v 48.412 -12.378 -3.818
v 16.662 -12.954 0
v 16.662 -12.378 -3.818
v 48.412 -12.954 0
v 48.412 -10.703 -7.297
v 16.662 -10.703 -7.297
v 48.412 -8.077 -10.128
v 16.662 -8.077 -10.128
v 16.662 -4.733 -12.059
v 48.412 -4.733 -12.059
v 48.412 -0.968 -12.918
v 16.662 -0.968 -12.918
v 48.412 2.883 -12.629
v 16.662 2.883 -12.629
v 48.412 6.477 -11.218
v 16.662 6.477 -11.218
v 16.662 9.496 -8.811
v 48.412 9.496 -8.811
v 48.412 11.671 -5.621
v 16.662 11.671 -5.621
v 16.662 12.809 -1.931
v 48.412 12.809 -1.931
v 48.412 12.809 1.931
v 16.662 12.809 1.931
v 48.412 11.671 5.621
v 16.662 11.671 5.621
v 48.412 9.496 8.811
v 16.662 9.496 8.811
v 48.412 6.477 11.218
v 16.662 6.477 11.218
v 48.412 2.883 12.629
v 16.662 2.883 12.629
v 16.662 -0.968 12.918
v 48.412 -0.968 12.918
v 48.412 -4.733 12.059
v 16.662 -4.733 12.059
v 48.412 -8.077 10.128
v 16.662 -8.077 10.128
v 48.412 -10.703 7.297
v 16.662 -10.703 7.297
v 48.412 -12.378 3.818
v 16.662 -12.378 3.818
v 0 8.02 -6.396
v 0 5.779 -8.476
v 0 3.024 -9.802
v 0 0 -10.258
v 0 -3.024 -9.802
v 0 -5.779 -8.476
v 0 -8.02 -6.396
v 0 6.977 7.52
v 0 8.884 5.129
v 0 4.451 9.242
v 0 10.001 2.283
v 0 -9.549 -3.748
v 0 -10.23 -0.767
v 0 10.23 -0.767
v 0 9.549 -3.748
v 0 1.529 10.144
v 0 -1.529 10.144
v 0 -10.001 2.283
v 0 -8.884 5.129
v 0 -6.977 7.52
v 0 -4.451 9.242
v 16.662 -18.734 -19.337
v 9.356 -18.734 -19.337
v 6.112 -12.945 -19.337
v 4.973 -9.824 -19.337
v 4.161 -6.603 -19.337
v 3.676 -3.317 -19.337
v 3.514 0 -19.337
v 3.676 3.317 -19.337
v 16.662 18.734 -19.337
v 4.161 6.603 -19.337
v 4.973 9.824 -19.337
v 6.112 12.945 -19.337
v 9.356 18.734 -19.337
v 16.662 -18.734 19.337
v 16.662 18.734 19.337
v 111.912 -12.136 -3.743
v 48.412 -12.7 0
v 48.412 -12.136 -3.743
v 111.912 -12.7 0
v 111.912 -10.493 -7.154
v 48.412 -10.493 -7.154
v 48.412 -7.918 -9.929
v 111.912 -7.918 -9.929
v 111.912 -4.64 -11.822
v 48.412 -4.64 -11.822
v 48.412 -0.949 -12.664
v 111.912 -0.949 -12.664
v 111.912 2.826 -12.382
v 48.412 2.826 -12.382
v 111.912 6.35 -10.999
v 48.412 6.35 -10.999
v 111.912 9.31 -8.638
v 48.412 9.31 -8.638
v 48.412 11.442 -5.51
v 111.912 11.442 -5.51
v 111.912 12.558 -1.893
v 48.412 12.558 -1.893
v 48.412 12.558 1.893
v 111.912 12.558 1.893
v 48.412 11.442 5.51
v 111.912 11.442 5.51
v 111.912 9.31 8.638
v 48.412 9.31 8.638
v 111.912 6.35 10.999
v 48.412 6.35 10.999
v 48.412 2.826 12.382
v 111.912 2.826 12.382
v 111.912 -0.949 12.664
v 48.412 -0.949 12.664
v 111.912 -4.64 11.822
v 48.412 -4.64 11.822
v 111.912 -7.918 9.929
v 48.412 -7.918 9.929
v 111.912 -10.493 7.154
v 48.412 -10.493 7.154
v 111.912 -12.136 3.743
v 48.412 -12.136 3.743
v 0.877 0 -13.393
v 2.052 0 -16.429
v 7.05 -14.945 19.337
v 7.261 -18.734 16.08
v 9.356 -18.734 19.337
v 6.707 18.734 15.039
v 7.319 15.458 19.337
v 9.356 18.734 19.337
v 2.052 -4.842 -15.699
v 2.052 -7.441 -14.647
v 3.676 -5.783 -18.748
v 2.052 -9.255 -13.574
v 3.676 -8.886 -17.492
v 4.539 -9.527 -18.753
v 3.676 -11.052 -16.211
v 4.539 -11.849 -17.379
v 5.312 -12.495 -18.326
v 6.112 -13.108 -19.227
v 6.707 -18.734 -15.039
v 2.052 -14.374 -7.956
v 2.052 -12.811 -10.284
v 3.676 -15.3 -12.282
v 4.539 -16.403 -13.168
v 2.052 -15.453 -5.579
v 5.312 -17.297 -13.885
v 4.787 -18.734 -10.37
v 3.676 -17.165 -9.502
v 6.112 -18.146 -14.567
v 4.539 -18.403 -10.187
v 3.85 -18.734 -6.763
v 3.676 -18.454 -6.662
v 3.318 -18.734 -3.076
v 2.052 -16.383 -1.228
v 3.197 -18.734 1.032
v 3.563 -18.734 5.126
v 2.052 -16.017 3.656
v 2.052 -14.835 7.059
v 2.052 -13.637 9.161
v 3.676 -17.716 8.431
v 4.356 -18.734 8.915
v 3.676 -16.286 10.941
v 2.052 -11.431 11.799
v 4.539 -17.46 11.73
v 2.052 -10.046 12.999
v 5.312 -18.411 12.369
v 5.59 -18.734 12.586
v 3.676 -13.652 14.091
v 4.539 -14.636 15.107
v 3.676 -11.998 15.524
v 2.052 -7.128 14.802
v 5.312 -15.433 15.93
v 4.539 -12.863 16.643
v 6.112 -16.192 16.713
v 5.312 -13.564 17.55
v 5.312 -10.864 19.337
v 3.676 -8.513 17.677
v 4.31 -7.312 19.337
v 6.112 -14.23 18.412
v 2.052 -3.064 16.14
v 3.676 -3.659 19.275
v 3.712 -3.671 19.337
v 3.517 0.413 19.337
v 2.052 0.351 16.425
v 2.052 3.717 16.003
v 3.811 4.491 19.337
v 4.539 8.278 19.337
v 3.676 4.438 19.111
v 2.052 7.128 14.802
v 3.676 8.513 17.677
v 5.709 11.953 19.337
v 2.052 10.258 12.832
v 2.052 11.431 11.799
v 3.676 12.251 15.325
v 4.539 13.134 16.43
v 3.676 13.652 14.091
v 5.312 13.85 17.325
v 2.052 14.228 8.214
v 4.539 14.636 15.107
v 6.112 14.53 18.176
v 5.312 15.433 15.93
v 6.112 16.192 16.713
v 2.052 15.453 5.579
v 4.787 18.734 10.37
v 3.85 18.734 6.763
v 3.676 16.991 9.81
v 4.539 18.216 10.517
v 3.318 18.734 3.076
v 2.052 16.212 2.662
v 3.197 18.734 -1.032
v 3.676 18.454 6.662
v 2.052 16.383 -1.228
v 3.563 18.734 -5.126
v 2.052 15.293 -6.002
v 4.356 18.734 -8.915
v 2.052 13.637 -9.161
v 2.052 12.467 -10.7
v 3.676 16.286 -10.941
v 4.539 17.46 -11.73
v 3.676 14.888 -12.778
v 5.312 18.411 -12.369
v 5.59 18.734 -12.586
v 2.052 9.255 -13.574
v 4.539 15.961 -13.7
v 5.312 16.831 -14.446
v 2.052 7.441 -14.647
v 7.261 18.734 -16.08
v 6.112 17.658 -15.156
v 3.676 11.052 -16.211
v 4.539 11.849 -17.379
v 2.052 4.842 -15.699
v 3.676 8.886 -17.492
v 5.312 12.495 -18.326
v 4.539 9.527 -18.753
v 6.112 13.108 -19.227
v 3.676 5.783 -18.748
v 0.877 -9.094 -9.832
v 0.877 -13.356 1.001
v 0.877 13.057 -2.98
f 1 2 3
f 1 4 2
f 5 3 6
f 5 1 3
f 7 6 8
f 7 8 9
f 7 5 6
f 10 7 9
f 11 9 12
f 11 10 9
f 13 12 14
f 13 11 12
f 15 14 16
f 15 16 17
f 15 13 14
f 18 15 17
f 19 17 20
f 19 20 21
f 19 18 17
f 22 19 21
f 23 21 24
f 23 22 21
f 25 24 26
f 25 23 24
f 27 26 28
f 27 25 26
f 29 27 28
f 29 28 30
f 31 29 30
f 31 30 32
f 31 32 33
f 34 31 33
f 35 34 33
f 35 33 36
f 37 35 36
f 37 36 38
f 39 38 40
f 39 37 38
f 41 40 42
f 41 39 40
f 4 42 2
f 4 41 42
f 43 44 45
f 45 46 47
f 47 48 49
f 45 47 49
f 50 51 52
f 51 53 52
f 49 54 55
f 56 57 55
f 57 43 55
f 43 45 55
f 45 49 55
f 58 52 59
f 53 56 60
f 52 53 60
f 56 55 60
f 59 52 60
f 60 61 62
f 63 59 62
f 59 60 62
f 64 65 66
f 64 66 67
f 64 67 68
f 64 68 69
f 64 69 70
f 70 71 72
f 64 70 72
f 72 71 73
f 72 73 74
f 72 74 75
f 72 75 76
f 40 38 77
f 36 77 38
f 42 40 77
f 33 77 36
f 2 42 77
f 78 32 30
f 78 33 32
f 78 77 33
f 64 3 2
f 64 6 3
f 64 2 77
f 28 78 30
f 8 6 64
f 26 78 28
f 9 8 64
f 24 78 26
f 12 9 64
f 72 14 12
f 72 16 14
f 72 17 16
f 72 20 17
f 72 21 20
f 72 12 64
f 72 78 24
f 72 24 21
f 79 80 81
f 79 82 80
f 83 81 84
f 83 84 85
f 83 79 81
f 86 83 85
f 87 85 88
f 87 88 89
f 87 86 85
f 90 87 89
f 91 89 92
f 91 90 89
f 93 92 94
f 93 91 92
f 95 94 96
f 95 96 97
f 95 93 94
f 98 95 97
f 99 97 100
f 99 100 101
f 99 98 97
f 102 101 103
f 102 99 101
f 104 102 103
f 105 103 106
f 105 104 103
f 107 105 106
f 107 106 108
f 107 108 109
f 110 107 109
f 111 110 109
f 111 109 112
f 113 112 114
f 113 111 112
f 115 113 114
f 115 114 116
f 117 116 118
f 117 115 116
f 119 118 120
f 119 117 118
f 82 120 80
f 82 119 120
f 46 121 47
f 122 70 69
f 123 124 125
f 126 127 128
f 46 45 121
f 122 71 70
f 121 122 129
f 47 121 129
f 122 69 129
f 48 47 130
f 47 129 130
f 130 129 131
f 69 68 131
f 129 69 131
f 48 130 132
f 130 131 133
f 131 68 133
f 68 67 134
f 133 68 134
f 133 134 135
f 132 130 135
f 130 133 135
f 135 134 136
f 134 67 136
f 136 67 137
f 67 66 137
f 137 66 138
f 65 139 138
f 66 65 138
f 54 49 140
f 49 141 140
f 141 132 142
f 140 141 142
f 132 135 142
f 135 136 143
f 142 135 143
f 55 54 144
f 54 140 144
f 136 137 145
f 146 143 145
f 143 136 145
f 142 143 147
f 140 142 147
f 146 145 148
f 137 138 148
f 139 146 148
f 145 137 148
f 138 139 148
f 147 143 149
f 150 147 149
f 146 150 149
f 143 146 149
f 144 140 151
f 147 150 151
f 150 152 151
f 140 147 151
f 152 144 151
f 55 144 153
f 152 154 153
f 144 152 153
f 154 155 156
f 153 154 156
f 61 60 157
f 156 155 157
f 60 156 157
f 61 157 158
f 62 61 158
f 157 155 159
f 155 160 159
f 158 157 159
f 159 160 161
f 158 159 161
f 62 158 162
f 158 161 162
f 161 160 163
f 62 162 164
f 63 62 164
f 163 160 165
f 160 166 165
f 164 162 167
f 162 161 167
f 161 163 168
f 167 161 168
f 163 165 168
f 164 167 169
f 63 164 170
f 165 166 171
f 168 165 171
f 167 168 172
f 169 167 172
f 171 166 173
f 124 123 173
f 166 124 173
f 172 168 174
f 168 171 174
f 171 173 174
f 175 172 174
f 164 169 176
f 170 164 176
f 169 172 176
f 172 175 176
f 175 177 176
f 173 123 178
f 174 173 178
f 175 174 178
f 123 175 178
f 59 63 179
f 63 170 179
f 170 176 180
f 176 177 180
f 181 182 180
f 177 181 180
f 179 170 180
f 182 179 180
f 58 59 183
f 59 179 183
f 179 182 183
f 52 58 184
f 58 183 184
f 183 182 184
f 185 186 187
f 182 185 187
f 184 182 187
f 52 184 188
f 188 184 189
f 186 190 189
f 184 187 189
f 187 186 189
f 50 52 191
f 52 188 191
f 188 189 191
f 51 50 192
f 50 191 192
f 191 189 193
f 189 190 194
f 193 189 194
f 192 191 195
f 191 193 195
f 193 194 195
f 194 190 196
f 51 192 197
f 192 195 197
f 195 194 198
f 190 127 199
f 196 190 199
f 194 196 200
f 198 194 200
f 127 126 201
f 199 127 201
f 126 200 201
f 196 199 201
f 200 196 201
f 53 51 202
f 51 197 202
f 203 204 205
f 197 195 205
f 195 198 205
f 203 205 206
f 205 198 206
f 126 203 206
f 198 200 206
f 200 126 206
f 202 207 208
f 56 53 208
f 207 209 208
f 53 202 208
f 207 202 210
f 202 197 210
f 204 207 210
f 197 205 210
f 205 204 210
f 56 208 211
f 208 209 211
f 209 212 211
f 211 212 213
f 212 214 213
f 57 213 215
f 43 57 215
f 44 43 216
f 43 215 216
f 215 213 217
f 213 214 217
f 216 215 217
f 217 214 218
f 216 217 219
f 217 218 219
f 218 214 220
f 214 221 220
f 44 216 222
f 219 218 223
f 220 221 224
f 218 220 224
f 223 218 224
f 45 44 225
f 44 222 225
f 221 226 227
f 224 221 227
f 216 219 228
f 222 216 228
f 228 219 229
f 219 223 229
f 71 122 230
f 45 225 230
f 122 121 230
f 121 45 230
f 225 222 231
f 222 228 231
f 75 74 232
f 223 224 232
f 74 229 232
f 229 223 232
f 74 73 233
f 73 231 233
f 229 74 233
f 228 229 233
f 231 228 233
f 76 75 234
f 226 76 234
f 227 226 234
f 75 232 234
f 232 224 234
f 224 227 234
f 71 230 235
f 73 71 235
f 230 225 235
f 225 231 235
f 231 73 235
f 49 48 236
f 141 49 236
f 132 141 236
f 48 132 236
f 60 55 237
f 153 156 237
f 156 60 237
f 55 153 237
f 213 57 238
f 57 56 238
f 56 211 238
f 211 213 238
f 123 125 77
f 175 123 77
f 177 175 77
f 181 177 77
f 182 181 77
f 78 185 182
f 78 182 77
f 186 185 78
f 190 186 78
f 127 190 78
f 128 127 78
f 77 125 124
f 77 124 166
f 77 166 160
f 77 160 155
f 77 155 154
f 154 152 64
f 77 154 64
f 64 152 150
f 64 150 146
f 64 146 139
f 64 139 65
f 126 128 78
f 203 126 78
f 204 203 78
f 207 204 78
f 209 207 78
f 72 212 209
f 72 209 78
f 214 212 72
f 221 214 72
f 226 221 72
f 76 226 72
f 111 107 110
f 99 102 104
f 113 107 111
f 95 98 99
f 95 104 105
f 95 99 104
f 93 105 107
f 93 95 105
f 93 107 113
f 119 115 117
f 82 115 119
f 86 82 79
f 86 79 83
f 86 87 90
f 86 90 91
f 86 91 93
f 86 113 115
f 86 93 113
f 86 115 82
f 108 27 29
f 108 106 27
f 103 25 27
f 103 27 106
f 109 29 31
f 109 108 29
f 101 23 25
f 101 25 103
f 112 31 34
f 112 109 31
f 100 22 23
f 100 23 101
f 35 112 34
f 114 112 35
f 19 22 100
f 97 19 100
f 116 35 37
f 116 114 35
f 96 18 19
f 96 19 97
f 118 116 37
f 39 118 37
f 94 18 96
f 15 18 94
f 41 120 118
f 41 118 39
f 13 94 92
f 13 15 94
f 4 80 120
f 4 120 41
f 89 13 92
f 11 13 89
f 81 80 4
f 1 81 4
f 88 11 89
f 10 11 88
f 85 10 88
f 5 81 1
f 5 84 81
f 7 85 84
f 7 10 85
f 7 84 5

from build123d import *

# Parameters (mm, degrees)
SKETCH2_W      = 38.6744488
SKETCH2_H      = 37.46857502
EXTRUDE1_DEPTH = 16.6624


with BuildPart() as part:
    # Sketch1 → Revolve1 (revolve)
    with BuildSketch(Plane.XY, mode=Mode.PRIVATE) as revolve1_sk:
        Polygon((111.9124, 0), (16.6624, 0), (16.6624, 12.954), (48.4124, 12.954), (48.4124, 12.7), (111.9124, 12.7), align=None)
    revolve(revolve1_sk.sketch.rotate(Axis((0, 0, 0), (1, 0, 0)), 180), axis=Axis((0, 0, 0), (1, 0, 0)))

    # Sketch2 → Extrude1 (add)
    with BuildSketch(Plane(origin=(0, 0, 0), x_dir=(0, 0, -1), z_dir=(1, 0, 0))):
        Rectangle(SKETCH2_W, SKETCH2_H)
    extrude(amount=EXTRUDE1_DEPTH)

    # Sketch3 → Cut-Revolve1 (revolve, cut)
    with BuildSketch(Plane.XY, mode=Mode.PRIVATE) as cut_revolve1_sk:
        with BuildLine():
            Line((0, 0), (0, 10.258215468))
            ThreePointArc((0, 10.258215468), (5.469928088, 22.402987857), (15.210208347, 31.488280924))
            Line((15.210208347, 31.488280924), (-5.301244899, 31.488280924))
            Line((-5.301244899, 31.488280924), (-5.301244899, 0))
            Line((-5.301244899, 0), (0, 0))
        make_face()
    revolve(cut_revolve1_sk.sketch.rotate(Axis((0, 0, 0), (-1, 0, 0)), 90), axis=Axis((0, 0, 0), (-1, 0, 0)), mode=Mode.SUBTRACT)


solid = part.part
